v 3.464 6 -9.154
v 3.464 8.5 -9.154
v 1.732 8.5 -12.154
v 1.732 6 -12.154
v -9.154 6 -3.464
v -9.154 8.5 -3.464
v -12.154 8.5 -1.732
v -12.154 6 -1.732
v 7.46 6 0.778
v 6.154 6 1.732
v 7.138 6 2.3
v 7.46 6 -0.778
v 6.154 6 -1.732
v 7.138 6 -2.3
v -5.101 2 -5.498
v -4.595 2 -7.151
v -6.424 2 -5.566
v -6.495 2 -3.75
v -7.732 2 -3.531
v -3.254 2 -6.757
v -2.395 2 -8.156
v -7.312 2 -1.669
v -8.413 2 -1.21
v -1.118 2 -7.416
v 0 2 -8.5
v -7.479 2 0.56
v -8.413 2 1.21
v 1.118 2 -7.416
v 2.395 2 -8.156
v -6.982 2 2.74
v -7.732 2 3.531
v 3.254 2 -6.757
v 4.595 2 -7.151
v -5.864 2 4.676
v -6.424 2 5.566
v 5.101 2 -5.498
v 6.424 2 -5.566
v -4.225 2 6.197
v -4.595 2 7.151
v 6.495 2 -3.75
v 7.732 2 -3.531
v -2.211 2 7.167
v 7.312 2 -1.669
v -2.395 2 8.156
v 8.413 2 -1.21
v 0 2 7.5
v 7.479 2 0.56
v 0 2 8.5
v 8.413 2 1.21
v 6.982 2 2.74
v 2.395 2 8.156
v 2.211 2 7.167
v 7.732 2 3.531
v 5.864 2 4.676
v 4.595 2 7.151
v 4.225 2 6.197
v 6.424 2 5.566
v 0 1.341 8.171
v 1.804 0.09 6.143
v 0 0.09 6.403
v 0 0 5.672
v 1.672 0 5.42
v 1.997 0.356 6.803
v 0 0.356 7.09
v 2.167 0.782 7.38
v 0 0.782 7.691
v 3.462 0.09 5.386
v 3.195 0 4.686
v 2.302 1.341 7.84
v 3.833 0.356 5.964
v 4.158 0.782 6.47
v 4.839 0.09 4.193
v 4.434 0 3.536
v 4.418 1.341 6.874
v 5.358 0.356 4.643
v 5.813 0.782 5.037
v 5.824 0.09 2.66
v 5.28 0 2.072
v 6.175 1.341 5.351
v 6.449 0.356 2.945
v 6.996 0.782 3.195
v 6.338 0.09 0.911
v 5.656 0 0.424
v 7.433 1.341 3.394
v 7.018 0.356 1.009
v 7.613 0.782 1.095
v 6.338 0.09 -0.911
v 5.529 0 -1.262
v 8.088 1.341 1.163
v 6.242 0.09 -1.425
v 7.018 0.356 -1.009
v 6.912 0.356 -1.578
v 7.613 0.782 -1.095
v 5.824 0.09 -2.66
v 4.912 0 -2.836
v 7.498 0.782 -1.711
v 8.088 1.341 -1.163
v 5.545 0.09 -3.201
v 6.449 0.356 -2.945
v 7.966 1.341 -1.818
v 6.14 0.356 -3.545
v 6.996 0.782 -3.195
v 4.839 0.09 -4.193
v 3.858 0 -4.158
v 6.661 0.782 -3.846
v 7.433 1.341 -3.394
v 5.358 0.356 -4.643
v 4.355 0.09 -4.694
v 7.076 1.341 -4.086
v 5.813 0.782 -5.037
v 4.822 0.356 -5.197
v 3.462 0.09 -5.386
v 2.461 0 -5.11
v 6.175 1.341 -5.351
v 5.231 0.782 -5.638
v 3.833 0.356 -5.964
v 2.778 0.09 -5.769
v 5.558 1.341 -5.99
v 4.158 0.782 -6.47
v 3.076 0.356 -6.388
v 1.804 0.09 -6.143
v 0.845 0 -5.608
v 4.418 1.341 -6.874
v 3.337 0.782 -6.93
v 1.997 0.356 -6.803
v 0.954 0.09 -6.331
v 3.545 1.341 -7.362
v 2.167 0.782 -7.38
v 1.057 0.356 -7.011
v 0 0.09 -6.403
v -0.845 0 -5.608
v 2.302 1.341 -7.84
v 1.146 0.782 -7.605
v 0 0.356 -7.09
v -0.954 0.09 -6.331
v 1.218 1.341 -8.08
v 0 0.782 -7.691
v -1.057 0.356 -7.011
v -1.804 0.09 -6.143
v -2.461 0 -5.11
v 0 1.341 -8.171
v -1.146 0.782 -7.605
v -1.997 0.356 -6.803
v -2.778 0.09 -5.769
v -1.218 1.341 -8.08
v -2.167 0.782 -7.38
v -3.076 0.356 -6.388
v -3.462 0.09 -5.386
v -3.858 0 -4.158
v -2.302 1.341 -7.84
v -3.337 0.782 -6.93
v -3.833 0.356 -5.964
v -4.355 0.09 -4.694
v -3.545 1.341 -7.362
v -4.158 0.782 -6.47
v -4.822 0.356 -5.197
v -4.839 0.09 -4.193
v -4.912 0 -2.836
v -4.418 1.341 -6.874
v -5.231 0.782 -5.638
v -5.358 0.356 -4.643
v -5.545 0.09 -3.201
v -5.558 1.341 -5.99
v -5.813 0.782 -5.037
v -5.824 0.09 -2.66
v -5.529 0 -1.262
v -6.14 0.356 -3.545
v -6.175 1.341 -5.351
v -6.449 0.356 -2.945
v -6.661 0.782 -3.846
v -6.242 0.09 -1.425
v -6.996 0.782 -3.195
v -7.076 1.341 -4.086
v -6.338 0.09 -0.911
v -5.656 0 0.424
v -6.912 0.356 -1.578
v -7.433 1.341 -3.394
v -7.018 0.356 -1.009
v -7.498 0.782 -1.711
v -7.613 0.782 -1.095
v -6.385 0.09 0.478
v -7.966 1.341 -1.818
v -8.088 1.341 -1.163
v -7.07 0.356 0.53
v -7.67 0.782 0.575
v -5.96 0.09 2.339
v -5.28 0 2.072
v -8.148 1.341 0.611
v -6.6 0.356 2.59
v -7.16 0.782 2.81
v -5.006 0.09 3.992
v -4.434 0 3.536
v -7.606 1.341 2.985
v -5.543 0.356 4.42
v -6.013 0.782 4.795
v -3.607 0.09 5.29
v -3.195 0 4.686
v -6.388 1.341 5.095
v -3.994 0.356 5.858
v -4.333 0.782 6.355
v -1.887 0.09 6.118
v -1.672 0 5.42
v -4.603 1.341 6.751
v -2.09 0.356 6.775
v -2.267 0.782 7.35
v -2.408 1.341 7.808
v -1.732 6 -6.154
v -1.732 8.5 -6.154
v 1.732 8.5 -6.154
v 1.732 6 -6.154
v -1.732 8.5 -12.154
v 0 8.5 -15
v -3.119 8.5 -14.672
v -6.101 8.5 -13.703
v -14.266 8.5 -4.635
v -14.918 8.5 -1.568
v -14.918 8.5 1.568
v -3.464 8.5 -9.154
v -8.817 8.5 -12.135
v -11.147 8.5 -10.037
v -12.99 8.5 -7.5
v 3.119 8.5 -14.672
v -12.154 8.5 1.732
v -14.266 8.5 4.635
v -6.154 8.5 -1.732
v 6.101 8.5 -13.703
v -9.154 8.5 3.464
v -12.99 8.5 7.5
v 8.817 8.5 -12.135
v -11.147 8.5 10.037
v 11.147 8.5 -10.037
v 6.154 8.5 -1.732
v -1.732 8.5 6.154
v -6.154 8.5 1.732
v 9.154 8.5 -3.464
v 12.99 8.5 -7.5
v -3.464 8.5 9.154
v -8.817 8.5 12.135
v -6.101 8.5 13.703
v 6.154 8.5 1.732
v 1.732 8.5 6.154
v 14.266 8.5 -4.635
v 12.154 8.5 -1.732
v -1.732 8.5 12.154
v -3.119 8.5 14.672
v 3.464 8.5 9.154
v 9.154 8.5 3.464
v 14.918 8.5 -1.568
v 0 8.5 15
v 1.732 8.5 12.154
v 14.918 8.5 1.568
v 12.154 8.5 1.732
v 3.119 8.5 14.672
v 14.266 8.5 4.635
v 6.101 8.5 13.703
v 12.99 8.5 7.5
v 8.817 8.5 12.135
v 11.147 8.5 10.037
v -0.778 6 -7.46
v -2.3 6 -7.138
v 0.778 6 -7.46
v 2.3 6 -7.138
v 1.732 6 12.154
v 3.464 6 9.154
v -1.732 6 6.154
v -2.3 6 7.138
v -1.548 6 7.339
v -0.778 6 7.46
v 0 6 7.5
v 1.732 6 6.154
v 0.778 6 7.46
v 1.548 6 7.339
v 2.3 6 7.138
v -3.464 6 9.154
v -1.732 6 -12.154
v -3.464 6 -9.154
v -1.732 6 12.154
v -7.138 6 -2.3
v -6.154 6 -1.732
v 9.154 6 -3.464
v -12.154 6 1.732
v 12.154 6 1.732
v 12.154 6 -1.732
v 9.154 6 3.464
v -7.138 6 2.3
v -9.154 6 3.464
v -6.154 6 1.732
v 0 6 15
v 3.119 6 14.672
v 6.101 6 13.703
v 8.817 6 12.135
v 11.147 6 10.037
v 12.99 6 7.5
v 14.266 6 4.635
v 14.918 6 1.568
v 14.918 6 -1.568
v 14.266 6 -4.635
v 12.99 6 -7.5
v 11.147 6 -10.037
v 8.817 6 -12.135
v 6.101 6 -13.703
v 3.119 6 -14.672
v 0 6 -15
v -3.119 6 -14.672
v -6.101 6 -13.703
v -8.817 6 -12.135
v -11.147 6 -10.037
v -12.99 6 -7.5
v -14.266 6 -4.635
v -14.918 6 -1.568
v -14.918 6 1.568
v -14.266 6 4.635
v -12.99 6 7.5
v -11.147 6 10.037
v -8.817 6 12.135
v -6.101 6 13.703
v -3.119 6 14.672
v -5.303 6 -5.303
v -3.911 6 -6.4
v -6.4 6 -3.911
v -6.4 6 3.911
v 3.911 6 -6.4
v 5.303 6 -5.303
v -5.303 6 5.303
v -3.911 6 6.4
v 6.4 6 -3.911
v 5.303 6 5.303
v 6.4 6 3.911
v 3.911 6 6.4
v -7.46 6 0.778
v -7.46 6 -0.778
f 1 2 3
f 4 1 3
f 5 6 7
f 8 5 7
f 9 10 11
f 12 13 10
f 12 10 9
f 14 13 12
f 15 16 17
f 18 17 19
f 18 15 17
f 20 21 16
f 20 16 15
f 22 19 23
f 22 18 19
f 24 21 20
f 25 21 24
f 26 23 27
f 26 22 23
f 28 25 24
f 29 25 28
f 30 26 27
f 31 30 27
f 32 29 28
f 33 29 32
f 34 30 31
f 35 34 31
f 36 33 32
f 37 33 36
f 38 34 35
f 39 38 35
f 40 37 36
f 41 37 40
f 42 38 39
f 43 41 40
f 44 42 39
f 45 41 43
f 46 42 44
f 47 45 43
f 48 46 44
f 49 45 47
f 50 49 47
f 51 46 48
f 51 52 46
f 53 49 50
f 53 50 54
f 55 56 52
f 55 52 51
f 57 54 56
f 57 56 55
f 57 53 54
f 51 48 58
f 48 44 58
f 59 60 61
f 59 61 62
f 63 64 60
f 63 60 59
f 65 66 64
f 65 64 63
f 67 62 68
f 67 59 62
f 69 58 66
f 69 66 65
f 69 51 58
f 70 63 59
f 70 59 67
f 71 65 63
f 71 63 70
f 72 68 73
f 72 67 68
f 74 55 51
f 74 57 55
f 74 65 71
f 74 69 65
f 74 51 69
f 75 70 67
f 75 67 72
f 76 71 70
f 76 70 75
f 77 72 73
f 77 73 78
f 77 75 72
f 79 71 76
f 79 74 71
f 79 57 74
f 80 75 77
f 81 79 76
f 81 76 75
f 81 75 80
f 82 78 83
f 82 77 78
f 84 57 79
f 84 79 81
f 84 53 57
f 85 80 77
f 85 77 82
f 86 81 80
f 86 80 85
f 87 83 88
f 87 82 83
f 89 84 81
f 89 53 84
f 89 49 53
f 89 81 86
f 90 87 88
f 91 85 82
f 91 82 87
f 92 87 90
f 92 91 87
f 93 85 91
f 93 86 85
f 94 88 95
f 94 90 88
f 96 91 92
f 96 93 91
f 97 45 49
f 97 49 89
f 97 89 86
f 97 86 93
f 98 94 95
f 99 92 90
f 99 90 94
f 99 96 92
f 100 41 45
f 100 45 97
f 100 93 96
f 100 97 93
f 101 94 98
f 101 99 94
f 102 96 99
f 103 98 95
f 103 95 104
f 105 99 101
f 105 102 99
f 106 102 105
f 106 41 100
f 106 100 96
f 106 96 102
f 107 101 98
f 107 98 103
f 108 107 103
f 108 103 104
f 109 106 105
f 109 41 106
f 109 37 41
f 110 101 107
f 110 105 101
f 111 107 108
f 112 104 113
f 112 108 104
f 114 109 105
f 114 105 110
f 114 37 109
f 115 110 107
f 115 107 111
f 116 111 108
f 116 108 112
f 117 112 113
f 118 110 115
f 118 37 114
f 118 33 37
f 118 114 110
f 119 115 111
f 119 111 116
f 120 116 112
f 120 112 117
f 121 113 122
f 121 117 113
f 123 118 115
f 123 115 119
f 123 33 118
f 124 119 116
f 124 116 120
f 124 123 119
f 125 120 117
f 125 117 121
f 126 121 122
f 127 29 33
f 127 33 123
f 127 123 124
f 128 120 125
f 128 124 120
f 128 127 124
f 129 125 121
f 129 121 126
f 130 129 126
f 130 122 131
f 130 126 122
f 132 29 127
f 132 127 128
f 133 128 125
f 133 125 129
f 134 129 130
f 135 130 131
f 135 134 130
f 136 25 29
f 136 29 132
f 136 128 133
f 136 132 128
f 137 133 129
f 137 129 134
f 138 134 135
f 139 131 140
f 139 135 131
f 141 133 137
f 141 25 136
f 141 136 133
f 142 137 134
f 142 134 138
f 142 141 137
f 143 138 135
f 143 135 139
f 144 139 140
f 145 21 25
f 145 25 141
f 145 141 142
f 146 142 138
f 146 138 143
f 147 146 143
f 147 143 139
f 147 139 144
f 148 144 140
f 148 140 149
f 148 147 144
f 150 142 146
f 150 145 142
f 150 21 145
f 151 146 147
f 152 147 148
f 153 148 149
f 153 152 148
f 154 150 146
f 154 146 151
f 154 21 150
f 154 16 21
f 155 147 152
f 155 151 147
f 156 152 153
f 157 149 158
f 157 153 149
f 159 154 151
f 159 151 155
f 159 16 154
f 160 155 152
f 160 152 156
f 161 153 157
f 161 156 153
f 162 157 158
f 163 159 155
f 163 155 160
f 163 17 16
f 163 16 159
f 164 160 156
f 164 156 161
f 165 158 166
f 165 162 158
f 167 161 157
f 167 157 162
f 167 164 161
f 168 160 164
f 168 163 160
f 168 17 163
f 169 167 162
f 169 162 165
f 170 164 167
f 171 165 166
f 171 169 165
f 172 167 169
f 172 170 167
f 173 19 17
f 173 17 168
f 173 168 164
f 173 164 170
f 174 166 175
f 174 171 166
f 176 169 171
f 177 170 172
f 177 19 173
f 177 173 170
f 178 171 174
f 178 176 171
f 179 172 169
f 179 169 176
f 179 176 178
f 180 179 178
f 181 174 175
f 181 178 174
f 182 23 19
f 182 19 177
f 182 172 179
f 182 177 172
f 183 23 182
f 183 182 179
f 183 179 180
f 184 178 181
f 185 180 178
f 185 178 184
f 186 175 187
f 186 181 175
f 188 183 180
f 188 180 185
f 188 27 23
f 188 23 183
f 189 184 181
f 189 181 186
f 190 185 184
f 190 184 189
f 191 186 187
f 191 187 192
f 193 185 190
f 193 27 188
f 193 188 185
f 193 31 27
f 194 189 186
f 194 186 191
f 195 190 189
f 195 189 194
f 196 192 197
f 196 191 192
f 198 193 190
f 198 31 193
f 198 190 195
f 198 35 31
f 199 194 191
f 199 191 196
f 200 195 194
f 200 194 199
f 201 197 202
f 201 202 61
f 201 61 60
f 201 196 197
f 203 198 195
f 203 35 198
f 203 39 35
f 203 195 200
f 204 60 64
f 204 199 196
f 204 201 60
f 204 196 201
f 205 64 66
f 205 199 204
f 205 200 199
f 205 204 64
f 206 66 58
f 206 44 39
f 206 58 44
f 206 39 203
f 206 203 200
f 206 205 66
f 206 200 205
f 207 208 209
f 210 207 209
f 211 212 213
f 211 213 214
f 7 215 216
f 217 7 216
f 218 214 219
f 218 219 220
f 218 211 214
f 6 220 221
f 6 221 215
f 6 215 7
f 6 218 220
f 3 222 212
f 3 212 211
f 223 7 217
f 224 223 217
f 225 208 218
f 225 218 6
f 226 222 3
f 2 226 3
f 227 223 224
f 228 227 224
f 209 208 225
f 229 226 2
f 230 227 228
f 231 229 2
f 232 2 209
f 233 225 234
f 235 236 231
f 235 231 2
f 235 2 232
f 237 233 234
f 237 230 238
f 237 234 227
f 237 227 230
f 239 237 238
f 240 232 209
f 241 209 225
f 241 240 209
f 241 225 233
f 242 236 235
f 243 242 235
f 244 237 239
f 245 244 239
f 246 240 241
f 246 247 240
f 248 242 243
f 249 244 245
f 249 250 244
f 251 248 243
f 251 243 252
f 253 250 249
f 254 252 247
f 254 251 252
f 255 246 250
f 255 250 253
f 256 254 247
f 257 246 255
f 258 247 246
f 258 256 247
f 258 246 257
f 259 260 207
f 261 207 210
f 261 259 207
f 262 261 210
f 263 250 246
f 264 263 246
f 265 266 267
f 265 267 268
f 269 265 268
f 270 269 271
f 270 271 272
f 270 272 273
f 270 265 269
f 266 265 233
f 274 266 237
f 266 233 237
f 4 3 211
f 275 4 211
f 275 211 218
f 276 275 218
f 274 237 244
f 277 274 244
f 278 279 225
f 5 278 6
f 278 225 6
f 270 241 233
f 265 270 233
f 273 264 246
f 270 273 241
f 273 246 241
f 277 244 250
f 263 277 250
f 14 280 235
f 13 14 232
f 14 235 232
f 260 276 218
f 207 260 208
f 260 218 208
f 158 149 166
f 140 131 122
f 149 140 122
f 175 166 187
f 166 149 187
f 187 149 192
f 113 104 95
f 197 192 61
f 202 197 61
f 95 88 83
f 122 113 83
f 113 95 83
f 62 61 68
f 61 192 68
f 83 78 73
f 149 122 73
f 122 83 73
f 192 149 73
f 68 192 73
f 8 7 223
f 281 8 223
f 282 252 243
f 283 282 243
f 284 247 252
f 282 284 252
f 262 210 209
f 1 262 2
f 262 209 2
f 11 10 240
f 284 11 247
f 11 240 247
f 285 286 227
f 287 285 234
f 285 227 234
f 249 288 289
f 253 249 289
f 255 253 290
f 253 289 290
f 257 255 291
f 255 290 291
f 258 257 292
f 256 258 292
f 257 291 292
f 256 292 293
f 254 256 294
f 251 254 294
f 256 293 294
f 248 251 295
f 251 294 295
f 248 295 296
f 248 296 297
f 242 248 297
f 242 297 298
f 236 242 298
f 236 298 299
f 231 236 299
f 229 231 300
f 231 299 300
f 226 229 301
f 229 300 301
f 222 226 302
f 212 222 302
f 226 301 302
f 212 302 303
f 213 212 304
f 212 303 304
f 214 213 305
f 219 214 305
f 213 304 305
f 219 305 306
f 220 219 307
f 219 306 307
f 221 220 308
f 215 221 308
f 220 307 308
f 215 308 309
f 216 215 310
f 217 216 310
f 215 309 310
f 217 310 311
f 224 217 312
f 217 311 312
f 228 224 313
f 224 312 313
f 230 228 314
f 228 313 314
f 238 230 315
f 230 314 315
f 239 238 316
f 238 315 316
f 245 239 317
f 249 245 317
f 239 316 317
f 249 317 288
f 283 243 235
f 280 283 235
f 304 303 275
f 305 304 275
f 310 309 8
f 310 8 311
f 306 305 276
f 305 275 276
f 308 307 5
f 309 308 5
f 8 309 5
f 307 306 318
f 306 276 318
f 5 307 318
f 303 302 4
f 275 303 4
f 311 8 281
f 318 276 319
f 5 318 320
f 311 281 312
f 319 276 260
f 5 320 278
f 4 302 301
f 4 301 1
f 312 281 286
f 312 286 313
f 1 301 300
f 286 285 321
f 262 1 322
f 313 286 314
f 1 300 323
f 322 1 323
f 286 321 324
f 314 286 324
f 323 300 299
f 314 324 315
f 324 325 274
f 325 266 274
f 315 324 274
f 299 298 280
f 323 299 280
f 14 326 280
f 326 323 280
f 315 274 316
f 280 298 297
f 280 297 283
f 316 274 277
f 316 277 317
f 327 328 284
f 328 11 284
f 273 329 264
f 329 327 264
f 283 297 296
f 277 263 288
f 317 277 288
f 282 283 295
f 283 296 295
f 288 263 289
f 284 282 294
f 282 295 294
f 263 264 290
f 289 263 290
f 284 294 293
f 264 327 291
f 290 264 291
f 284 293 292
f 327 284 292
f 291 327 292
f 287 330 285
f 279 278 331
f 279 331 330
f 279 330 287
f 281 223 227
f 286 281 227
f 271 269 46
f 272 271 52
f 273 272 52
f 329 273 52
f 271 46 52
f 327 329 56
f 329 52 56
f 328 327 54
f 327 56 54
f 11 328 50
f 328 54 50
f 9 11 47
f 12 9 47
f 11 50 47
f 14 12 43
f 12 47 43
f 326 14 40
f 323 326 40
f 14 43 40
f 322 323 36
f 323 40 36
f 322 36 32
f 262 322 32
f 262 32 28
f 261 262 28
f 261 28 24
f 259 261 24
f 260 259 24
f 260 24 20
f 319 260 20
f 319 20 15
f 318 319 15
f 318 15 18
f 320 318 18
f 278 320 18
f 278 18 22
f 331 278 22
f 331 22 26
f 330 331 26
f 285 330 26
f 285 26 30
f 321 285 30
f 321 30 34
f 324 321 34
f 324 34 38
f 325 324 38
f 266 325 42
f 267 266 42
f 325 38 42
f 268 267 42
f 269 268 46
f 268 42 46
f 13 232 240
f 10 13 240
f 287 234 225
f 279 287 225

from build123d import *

# Parameters (mm, degrees)
CROQUIS1_R              = 8.5
SALIENTE_EXTRUIR1_DEPTH = 2
CROQUIS2_R              = 7.5
SALIENTE_EXTRUIR2_DEPTH = 4
CROQUIS3_R              = 15
SALIENTE_EXTRUIR3_DEPTH = 2.5
REDONDEO1_R             = 3
CORTAR_EXTRUIR1_DEPTH   = 2.5


with BuildPart() as part:
    # Croquis1 → Saliente-Extruir1 (new body)
    with BuildSketch(Plane(origin=(0, 0, 0), x_dir=(1, 0, 0), z_dir=(0, 1, 0))):
        with Locations(Location((0, 0, 0), (0, 0, 270))):
            Circle(CROQUIS1_R)
    extrude(amount=SALIENTE_EXTRUIR1_DEPTH)

    # Croquis2 → Saliente-Extruir2 (add)
    with BuildSketch(Plane(origin=(0, 2, 0), x_dir=(1, 0, 0), z_dir=(0, 1, 0))):
        with Locations(Location((0, 0, 0), (0, 0, 270))):
            Circle(CROQUIS2_R)
    extrude(amount=SALIENTE_EXTRUIR2_DEPTH)

    # Croquis3 → Saliente-Extruir3 (add)
    with BuildSketch(Plane(origin=(0, 6, 0), x_dir=(1, 0, 0), z_dir=(0, 1, 0))):
        with Locations(Location((0, 0, 0), (0, 0, 270))):
            Circle(CROQUIS3_R)
    extrude(amount=SALIENTE_EXTRUIR3_DEPTH)

    # Redondeo1
    # the kernel refuses this fillet: 3 mm, written as the material it takes off along each edge
    with BuildSketch(Plane(origin=(0, 0, 0), x_dir=(0, 0, 1), z_dir=(-1, 0, 0))) as redondeo1_piece_1:
        with BuildLine():
            CenterArc((5.671572875, 3), REDONDEO1_R, 270, 70.528779366)
            Line((5.671572875, 0), (5.671572875, -0.06))
            Line((5.671572875, -0.06), (8.5, -0.06))
            Line((8.5, -0.06), (8.56, 0))
            ThreePointArc((8.56, 0), (8.56, 1), (8.556568542, 1.98))
            Line((8.556568542, 1.98), (8.5, 2))
        make_face()
    revolve(axis=Axis((0, 0, 0), (0, 1, 0)), mode=Mode.SUBTRACT)

    # Croquis4 → Cortar-Extruir1 (cut)
    with BuildSketch(Plane(origin=(0, 8.5, 0), x_dir=(1, 0, 0), z_dir=(0, 1, 0))):
        Polygon((12.154001459, -1.732050808), (12.154001459, 1.732050808), (9.154001459, 3.464101615), (6.154001459, 1.732050808), (6.154001459, -1.732050808), (9.154001459, -3.464101615), align=None)
        Polygon((3.464101615, 9.154001459), (1.732050808, 12.154001459), (-1.732050808, 12.154001459), (-3.464101615, 9.154001459), (-1.732050808, 6.154001459), (1.732050808, 6.154001459), align=None)
        Polygon((-1.732050808, -12.154001459), (1.732050808, -12.154001459), (3.464101615, -9.154001459), (1.732050808, -6.154001459), (-1.732050808, -6.154001459), (-3.464101615, -9.154001459), align=None)
        Polygon((-12.154001459, 1.732050808), (-12.154001459, -1.732050808), (-9.154001459, -3.464101615), (-6.154001459, -1.732050808), (-6.154001459, 1.732050808), (-9.154001459, 3.464101615), align=None)
    extrude(amount=-CORTAR_EXTRUIR1_DEPTH, mode=Mode.SUBTRACT)


solid = part.part
